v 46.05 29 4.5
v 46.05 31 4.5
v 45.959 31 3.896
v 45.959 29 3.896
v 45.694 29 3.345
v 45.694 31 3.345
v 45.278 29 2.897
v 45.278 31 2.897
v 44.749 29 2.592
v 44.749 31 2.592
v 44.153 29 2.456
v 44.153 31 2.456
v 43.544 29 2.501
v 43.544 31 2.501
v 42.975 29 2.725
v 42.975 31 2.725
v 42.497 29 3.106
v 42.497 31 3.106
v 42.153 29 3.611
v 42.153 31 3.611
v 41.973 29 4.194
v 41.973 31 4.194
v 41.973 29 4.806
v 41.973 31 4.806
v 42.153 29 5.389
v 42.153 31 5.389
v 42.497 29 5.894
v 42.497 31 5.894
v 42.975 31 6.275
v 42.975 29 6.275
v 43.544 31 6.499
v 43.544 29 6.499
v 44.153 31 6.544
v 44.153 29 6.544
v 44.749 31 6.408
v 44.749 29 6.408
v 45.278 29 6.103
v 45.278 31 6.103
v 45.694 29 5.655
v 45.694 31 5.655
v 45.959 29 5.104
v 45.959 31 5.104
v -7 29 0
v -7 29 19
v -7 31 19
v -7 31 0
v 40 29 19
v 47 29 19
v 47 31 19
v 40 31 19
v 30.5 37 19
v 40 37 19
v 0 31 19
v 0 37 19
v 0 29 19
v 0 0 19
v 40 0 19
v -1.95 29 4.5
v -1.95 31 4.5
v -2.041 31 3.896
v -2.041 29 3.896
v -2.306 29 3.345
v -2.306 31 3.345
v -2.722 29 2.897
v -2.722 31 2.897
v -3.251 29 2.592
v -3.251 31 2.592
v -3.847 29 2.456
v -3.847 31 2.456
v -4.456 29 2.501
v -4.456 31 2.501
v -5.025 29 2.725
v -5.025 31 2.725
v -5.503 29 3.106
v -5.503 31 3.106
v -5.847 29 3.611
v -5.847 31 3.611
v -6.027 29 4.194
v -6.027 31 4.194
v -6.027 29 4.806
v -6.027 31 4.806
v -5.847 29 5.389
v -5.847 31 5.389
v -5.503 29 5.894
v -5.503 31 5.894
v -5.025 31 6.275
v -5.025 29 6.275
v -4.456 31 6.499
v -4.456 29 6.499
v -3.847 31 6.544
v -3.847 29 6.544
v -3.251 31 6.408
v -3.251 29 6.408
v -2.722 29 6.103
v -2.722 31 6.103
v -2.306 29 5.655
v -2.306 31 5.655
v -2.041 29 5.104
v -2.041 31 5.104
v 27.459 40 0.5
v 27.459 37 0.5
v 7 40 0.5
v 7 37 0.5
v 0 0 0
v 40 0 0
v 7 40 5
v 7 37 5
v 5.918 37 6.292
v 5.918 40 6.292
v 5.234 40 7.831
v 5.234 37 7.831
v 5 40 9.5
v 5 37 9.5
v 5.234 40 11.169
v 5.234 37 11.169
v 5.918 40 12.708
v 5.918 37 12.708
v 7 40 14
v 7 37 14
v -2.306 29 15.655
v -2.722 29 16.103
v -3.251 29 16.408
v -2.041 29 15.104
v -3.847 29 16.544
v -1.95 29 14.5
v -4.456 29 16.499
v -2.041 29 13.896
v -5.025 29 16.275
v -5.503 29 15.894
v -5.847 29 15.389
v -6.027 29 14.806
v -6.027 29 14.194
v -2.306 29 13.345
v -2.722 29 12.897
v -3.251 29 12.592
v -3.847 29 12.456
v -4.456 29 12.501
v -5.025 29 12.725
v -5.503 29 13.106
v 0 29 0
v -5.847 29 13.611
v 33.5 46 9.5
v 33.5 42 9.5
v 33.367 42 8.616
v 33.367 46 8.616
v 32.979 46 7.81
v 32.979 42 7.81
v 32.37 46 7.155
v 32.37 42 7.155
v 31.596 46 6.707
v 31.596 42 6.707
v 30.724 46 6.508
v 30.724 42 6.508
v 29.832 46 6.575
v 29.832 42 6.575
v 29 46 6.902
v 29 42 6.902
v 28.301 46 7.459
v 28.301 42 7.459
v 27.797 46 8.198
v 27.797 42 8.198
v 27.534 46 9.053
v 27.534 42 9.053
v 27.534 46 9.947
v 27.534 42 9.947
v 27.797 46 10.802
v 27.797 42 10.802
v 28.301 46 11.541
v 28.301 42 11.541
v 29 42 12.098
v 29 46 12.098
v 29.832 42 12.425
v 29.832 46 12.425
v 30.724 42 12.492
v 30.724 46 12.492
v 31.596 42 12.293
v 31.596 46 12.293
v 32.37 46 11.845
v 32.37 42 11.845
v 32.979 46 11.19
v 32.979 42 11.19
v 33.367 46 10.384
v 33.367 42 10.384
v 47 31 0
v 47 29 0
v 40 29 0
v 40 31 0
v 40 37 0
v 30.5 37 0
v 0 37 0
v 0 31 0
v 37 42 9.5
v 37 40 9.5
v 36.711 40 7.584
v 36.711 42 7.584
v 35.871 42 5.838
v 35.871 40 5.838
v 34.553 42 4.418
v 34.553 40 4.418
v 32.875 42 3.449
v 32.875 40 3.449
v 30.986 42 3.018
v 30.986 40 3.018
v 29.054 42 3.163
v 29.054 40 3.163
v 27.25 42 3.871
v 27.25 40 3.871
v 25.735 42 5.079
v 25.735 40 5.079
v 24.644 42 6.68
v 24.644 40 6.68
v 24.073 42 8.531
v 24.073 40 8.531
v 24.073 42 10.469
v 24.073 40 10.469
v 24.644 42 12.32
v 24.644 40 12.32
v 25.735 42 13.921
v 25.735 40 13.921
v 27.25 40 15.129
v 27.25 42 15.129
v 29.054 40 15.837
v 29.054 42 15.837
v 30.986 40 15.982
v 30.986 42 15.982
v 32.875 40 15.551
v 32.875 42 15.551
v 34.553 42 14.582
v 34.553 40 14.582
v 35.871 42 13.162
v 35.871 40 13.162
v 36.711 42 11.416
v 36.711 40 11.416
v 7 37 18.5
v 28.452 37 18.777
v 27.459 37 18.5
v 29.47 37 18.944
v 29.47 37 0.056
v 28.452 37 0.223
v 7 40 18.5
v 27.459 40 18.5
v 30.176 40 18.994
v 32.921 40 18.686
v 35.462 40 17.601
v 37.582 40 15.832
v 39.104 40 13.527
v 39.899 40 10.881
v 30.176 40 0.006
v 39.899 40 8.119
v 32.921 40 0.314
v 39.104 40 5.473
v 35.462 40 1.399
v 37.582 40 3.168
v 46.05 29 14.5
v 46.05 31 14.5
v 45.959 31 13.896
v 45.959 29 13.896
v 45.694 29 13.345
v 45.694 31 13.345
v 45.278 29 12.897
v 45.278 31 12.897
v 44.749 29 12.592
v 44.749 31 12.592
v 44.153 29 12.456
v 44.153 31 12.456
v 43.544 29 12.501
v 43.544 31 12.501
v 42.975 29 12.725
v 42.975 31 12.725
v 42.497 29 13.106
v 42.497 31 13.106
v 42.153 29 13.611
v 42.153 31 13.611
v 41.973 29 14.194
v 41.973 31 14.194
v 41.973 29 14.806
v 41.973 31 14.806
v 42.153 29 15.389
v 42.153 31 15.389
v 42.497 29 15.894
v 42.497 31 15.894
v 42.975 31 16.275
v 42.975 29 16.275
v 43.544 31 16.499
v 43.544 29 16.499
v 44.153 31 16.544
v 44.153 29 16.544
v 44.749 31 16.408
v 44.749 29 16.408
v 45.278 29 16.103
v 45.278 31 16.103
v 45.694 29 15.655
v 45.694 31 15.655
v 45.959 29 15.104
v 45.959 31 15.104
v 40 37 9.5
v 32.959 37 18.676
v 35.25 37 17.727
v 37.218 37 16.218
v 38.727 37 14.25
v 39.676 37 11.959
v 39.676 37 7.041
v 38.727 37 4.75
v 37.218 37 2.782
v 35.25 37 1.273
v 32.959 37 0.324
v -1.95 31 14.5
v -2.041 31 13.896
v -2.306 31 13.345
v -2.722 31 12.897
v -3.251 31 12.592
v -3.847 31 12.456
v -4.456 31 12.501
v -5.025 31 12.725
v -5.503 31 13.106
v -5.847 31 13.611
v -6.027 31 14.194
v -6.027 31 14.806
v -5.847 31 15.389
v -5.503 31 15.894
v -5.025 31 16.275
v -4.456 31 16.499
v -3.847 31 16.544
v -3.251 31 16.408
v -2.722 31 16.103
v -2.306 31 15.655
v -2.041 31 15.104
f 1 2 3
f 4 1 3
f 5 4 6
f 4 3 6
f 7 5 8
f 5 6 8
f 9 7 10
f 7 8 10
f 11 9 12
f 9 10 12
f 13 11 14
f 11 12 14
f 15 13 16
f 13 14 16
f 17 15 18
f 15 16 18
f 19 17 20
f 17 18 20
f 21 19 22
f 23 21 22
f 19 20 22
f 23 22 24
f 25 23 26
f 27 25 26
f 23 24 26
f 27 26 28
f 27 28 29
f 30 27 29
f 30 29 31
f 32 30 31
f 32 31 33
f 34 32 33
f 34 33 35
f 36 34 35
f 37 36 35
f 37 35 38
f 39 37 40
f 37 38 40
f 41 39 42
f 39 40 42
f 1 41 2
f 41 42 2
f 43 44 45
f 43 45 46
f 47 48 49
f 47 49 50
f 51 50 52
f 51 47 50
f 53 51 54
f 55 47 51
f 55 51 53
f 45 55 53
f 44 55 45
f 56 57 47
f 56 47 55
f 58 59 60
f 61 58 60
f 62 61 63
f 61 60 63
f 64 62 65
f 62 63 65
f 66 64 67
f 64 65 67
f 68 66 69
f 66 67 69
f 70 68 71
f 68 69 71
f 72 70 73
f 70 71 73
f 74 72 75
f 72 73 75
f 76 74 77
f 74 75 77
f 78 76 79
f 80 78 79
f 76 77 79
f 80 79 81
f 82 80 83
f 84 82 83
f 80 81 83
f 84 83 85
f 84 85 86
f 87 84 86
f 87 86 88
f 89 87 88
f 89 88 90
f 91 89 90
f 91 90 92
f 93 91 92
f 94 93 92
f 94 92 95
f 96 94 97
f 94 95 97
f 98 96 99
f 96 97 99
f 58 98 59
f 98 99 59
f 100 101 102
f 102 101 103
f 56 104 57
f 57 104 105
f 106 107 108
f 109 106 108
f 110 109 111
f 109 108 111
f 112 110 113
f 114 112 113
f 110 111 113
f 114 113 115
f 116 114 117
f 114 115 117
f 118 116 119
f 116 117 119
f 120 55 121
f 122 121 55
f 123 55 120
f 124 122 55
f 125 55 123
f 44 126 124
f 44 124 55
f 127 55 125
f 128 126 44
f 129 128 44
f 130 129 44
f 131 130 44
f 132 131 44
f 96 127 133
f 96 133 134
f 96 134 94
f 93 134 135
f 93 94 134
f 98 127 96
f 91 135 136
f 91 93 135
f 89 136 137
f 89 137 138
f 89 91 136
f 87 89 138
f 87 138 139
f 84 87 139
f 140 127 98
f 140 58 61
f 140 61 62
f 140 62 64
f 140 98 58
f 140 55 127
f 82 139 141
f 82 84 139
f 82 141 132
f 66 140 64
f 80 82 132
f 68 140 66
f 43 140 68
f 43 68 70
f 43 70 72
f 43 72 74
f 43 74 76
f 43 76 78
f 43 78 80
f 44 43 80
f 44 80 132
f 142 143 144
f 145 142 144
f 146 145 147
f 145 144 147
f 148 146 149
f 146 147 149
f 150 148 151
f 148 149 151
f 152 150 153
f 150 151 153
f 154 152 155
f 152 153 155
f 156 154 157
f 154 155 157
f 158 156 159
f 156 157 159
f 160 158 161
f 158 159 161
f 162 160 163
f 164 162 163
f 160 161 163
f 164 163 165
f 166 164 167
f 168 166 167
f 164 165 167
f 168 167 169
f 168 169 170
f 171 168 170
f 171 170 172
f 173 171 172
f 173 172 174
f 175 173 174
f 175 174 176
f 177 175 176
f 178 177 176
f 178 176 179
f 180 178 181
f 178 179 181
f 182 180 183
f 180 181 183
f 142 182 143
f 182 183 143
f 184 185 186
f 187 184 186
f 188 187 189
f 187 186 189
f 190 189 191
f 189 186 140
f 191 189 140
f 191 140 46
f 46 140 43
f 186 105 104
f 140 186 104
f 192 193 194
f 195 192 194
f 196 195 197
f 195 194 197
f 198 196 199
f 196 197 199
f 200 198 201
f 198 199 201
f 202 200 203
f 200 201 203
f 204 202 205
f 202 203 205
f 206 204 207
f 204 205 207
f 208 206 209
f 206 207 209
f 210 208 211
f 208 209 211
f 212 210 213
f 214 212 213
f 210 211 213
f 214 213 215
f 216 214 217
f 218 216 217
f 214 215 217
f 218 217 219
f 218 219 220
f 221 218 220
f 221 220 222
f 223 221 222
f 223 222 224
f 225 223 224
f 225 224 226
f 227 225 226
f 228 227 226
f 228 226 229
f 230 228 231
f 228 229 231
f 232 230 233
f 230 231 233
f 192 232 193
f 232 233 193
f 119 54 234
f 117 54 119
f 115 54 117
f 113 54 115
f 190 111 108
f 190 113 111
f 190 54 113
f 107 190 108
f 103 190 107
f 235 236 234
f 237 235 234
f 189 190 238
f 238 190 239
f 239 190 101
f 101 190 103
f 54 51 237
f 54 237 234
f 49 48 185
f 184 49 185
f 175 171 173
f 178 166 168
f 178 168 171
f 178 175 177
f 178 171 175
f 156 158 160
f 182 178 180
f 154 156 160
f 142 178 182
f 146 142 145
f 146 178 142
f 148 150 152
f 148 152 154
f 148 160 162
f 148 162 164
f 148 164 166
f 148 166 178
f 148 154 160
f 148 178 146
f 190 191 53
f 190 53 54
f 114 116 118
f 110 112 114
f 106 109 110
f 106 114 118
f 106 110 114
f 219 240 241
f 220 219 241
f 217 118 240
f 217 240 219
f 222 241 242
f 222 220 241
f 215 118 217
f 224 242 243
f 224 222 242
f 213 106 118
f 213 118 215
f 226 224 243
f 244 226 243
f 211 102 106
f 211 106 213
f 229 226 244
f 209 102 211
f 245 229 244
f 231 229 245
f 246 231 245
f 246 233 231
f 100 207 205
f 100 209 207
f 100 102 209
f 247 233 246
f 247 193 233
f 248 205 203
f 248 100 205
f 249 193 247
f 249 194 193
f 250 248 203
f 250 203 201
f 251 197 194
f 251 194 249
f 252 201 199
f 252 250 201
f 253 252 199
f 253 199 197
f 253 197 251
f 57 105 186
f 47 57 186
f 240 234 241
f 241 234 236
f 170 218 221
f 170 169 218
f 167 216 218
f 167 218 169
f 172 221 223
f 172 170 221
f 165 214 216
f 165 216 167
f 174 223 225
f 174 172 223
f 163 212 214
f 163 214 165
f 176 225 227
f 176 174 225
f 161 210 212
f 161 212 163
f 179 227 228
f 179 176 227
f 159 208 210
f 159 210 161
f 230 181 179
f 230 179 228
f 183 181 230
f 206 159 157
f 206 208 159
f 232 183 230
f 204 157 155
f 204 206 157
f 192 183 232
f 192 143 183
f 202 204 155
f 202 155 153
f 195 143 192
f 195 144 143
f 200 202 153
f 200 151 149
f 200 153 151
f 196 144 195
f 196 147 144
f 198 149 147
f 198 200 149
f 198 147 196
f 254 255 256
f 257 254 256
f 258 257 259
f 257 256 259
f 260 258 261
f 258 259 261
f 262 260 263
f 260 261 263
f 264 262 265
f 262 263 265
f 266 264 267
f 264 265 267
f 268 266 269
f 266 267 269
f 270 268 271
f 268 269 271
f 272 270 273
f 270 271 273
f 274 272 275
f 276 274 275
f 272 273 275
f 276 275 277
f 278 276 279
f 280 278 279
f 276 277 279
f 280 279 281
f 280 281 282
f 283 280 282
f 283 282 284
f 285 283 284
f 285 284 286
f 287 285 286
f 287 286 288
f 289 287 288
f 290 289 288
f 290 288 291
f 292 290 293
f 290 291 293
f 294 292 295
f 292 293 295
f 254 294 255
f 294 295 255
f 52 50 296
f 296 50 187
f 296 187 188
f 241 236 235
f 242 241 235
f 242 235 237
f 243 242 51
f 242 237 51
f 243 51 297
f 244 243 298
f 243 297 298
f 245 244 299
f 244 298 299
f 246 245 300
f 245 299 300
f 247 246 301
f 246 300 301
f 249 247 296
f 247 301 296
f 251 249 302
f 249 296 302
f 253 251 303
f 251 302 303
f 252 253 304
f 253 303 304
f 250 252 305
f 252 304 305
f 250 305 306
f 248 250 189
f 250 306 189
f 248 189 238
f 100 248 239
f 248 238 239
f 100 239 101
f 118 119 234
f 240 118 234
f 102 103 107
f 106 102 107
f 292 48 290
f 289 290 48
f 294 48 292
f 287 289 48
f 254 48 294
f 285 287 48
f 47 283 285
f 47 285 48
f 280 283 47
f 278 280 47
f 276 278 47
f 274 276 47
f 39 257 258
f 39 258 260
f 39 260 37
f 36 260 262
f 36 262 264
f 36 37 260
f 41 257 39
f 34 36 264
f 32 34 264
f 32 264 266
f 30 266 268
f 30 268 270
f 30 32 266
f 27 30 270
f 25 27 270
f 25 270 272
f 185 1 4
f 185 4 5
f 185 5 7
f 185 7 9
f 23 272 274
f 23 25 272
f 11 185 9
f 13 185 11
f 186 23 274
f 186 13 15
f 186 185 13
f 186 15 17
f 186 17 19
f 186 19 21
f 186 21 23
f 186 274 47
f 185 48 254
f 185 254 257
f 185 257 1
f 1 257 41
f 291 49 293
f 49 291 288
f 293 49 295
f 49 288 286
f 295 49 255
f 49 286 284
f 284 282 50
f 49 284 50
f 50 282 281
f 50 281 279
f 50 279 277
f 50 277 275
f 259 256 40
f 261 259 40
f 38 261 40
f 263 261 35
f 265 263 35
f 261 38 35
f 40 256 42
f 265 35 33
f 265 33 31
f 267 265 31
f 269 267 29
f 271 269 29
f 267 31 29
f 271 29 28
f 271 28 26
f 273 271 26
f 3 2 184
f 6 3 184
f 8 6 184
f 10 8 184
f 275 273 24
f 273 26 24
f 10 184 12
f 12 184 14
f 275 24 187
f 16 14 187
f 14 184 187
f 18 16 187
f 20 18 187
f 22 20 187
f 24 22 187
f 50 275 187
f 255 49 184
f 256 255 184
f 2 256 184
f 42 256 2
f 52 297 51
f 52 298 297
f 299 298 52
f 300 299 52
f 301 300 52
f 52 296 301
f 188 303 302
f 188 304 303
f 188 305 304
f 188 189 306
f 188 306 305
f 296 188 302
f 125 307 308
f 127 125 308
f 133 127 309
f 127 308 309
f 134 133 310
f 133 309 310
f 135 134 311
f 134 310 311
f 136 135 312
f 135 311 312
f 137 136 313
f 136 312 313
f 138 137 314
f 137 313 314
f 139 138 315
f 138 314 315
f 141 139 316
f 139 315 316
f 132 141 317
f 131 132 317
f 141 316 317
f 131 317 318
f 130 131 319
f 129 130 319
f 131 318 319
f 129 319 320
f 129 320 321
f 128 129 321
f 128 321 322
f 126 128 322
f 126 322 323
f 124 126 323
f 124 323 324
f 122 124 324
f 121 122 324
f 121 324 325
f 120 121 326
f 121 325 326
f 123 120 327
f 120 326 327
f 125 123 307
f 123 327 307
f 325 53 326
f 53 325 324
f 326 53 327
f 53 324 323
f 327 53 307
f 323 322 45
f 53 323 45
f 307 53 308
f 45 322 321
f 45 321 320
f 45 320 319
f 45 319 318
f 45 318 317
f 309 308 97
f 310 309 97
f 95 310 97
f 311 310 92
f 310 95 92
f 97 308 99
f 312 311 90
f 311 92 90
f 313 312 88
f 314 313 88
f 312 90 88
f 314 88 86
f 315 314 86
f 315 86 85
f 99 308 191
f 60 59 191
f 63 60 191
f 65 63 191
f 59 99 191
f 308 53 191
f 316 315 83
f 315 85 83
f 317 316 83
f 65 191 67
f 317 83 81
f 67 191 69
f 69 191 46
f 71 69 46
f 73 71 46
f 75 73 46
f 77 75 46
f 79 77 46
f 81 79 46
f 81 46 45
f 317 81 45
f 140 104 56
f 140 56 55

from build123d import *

# Parameters (mm, degrees)
SKETCH1_W           = 40
SKETCH1_H           = 37
BOSS_EXTRUDE1_DEPTH = 19
BOSS_EXTRUDE2_DEPTH = 3
SKETCH3_R           = 6.5
BOSS_EXTRUDE3_DEPTH = 2
SKETCH5_R           = 3
BOSS_EXTRUDE4_DEPTH = 4
SKETCH6_W           = 54
SKETCH6_H           = 19
BOSS_EXTRUDE5_DEPTH = 2
SKETCH7_R           = 2.05
CUT_EXTRUDE1_DEPTH  = 2


with BuildPart() as part:
    # Sketch1 → Boss-Extrude1 (new body)
    with BuildSketch(Plane.XY):
        with Locations((20, 18.5)):
            Rectangle(SKETCH1_W, SKETCH1_H)
    extrude(amount=BOSS_EXTRUDE1_DEPTH)

    # Sketch2 → Boss-Extrude2 (add)
    with BuildSketch(Plane(origin=(0, 37, 0), x_dir=(1, 0, 0), z_dir=(0, 1, 0))):
        with BuildLine():
            Line((7, -0.5), (7, -5))
            ThreePointArc((7, -5), (5, -9.5), (7, -14))
            Line((7, -14), (7, -18.5))
            Line((7, -18.5), (27.458618735, -18.5))
            ThreePointArc((27.458618735, -18.5), (40, -9.5), (27.458618735, -0.5))
            Line((27.458618735, -0.5), (7, -0.5))
        make_face()
    extrude(amount=BOSS_EXTRUDE2_DEPTH)

    # Sketch3 → Boss-Extrude3 (add)
    with BuildSketch(Plane(origin=(0, 40, 0), x_dir=(1, 0, 0), z_dir=(0, 1, 0))):
        with Locations((30.5, -9.5)):
            Circle(SKETCH3_R)
    extrude(amount=BOSS_EXTRUDE3_DEPTH)

    # Sketch5 → Boss-Extrude4 (add)
    with BuildSketch(Plane(origin=(0, 42, 0), x_dir=(1, 0, 0), z_dir=(0, 1, 0))):
        with Locations((30.5, -9.5)):
            Circle(SKETCH5_R)
    extrude(amount=BOSS_EXTRUDE4_DEPTH)

    # Sketch6 → Boss-Extrude5 (add)
    with BuildSketch(Plane(origin=(0, 28.999999912, 0), x_dir=(-1, 0, 0), z_dir=(0, -1, 0))):
        with Locations((-20, -9.5)):
            Rectangle(SKETCH6_W, SKETCH6_H)
    extrude(amount=-BOSS_EXTRUDE5_DEPTH)

    # Sketch7 → Cut-Extrude1 (cut)
    with BuildSketch(Plane(origin=(0, 30.999999912, 0), x_dir=(1, 0, 0), z_dir=(0, 1, 0))):
        with Locations((-4, -4.5)):
            Circle(SKETCH7_R)
        with Locations((-4, -14.5)):
            Circle(SKETCH7_R)
        with Locations((44, -4.5)):
            Circle(SKETCH7_R)
        with Locations((44, -14.5)):
            Circle(SKETCH7_R)
    extrude(amount=-CUT_EXTRUDE1_DEPTH, mode=Mode.SUBTRACT)


solid = part.part
